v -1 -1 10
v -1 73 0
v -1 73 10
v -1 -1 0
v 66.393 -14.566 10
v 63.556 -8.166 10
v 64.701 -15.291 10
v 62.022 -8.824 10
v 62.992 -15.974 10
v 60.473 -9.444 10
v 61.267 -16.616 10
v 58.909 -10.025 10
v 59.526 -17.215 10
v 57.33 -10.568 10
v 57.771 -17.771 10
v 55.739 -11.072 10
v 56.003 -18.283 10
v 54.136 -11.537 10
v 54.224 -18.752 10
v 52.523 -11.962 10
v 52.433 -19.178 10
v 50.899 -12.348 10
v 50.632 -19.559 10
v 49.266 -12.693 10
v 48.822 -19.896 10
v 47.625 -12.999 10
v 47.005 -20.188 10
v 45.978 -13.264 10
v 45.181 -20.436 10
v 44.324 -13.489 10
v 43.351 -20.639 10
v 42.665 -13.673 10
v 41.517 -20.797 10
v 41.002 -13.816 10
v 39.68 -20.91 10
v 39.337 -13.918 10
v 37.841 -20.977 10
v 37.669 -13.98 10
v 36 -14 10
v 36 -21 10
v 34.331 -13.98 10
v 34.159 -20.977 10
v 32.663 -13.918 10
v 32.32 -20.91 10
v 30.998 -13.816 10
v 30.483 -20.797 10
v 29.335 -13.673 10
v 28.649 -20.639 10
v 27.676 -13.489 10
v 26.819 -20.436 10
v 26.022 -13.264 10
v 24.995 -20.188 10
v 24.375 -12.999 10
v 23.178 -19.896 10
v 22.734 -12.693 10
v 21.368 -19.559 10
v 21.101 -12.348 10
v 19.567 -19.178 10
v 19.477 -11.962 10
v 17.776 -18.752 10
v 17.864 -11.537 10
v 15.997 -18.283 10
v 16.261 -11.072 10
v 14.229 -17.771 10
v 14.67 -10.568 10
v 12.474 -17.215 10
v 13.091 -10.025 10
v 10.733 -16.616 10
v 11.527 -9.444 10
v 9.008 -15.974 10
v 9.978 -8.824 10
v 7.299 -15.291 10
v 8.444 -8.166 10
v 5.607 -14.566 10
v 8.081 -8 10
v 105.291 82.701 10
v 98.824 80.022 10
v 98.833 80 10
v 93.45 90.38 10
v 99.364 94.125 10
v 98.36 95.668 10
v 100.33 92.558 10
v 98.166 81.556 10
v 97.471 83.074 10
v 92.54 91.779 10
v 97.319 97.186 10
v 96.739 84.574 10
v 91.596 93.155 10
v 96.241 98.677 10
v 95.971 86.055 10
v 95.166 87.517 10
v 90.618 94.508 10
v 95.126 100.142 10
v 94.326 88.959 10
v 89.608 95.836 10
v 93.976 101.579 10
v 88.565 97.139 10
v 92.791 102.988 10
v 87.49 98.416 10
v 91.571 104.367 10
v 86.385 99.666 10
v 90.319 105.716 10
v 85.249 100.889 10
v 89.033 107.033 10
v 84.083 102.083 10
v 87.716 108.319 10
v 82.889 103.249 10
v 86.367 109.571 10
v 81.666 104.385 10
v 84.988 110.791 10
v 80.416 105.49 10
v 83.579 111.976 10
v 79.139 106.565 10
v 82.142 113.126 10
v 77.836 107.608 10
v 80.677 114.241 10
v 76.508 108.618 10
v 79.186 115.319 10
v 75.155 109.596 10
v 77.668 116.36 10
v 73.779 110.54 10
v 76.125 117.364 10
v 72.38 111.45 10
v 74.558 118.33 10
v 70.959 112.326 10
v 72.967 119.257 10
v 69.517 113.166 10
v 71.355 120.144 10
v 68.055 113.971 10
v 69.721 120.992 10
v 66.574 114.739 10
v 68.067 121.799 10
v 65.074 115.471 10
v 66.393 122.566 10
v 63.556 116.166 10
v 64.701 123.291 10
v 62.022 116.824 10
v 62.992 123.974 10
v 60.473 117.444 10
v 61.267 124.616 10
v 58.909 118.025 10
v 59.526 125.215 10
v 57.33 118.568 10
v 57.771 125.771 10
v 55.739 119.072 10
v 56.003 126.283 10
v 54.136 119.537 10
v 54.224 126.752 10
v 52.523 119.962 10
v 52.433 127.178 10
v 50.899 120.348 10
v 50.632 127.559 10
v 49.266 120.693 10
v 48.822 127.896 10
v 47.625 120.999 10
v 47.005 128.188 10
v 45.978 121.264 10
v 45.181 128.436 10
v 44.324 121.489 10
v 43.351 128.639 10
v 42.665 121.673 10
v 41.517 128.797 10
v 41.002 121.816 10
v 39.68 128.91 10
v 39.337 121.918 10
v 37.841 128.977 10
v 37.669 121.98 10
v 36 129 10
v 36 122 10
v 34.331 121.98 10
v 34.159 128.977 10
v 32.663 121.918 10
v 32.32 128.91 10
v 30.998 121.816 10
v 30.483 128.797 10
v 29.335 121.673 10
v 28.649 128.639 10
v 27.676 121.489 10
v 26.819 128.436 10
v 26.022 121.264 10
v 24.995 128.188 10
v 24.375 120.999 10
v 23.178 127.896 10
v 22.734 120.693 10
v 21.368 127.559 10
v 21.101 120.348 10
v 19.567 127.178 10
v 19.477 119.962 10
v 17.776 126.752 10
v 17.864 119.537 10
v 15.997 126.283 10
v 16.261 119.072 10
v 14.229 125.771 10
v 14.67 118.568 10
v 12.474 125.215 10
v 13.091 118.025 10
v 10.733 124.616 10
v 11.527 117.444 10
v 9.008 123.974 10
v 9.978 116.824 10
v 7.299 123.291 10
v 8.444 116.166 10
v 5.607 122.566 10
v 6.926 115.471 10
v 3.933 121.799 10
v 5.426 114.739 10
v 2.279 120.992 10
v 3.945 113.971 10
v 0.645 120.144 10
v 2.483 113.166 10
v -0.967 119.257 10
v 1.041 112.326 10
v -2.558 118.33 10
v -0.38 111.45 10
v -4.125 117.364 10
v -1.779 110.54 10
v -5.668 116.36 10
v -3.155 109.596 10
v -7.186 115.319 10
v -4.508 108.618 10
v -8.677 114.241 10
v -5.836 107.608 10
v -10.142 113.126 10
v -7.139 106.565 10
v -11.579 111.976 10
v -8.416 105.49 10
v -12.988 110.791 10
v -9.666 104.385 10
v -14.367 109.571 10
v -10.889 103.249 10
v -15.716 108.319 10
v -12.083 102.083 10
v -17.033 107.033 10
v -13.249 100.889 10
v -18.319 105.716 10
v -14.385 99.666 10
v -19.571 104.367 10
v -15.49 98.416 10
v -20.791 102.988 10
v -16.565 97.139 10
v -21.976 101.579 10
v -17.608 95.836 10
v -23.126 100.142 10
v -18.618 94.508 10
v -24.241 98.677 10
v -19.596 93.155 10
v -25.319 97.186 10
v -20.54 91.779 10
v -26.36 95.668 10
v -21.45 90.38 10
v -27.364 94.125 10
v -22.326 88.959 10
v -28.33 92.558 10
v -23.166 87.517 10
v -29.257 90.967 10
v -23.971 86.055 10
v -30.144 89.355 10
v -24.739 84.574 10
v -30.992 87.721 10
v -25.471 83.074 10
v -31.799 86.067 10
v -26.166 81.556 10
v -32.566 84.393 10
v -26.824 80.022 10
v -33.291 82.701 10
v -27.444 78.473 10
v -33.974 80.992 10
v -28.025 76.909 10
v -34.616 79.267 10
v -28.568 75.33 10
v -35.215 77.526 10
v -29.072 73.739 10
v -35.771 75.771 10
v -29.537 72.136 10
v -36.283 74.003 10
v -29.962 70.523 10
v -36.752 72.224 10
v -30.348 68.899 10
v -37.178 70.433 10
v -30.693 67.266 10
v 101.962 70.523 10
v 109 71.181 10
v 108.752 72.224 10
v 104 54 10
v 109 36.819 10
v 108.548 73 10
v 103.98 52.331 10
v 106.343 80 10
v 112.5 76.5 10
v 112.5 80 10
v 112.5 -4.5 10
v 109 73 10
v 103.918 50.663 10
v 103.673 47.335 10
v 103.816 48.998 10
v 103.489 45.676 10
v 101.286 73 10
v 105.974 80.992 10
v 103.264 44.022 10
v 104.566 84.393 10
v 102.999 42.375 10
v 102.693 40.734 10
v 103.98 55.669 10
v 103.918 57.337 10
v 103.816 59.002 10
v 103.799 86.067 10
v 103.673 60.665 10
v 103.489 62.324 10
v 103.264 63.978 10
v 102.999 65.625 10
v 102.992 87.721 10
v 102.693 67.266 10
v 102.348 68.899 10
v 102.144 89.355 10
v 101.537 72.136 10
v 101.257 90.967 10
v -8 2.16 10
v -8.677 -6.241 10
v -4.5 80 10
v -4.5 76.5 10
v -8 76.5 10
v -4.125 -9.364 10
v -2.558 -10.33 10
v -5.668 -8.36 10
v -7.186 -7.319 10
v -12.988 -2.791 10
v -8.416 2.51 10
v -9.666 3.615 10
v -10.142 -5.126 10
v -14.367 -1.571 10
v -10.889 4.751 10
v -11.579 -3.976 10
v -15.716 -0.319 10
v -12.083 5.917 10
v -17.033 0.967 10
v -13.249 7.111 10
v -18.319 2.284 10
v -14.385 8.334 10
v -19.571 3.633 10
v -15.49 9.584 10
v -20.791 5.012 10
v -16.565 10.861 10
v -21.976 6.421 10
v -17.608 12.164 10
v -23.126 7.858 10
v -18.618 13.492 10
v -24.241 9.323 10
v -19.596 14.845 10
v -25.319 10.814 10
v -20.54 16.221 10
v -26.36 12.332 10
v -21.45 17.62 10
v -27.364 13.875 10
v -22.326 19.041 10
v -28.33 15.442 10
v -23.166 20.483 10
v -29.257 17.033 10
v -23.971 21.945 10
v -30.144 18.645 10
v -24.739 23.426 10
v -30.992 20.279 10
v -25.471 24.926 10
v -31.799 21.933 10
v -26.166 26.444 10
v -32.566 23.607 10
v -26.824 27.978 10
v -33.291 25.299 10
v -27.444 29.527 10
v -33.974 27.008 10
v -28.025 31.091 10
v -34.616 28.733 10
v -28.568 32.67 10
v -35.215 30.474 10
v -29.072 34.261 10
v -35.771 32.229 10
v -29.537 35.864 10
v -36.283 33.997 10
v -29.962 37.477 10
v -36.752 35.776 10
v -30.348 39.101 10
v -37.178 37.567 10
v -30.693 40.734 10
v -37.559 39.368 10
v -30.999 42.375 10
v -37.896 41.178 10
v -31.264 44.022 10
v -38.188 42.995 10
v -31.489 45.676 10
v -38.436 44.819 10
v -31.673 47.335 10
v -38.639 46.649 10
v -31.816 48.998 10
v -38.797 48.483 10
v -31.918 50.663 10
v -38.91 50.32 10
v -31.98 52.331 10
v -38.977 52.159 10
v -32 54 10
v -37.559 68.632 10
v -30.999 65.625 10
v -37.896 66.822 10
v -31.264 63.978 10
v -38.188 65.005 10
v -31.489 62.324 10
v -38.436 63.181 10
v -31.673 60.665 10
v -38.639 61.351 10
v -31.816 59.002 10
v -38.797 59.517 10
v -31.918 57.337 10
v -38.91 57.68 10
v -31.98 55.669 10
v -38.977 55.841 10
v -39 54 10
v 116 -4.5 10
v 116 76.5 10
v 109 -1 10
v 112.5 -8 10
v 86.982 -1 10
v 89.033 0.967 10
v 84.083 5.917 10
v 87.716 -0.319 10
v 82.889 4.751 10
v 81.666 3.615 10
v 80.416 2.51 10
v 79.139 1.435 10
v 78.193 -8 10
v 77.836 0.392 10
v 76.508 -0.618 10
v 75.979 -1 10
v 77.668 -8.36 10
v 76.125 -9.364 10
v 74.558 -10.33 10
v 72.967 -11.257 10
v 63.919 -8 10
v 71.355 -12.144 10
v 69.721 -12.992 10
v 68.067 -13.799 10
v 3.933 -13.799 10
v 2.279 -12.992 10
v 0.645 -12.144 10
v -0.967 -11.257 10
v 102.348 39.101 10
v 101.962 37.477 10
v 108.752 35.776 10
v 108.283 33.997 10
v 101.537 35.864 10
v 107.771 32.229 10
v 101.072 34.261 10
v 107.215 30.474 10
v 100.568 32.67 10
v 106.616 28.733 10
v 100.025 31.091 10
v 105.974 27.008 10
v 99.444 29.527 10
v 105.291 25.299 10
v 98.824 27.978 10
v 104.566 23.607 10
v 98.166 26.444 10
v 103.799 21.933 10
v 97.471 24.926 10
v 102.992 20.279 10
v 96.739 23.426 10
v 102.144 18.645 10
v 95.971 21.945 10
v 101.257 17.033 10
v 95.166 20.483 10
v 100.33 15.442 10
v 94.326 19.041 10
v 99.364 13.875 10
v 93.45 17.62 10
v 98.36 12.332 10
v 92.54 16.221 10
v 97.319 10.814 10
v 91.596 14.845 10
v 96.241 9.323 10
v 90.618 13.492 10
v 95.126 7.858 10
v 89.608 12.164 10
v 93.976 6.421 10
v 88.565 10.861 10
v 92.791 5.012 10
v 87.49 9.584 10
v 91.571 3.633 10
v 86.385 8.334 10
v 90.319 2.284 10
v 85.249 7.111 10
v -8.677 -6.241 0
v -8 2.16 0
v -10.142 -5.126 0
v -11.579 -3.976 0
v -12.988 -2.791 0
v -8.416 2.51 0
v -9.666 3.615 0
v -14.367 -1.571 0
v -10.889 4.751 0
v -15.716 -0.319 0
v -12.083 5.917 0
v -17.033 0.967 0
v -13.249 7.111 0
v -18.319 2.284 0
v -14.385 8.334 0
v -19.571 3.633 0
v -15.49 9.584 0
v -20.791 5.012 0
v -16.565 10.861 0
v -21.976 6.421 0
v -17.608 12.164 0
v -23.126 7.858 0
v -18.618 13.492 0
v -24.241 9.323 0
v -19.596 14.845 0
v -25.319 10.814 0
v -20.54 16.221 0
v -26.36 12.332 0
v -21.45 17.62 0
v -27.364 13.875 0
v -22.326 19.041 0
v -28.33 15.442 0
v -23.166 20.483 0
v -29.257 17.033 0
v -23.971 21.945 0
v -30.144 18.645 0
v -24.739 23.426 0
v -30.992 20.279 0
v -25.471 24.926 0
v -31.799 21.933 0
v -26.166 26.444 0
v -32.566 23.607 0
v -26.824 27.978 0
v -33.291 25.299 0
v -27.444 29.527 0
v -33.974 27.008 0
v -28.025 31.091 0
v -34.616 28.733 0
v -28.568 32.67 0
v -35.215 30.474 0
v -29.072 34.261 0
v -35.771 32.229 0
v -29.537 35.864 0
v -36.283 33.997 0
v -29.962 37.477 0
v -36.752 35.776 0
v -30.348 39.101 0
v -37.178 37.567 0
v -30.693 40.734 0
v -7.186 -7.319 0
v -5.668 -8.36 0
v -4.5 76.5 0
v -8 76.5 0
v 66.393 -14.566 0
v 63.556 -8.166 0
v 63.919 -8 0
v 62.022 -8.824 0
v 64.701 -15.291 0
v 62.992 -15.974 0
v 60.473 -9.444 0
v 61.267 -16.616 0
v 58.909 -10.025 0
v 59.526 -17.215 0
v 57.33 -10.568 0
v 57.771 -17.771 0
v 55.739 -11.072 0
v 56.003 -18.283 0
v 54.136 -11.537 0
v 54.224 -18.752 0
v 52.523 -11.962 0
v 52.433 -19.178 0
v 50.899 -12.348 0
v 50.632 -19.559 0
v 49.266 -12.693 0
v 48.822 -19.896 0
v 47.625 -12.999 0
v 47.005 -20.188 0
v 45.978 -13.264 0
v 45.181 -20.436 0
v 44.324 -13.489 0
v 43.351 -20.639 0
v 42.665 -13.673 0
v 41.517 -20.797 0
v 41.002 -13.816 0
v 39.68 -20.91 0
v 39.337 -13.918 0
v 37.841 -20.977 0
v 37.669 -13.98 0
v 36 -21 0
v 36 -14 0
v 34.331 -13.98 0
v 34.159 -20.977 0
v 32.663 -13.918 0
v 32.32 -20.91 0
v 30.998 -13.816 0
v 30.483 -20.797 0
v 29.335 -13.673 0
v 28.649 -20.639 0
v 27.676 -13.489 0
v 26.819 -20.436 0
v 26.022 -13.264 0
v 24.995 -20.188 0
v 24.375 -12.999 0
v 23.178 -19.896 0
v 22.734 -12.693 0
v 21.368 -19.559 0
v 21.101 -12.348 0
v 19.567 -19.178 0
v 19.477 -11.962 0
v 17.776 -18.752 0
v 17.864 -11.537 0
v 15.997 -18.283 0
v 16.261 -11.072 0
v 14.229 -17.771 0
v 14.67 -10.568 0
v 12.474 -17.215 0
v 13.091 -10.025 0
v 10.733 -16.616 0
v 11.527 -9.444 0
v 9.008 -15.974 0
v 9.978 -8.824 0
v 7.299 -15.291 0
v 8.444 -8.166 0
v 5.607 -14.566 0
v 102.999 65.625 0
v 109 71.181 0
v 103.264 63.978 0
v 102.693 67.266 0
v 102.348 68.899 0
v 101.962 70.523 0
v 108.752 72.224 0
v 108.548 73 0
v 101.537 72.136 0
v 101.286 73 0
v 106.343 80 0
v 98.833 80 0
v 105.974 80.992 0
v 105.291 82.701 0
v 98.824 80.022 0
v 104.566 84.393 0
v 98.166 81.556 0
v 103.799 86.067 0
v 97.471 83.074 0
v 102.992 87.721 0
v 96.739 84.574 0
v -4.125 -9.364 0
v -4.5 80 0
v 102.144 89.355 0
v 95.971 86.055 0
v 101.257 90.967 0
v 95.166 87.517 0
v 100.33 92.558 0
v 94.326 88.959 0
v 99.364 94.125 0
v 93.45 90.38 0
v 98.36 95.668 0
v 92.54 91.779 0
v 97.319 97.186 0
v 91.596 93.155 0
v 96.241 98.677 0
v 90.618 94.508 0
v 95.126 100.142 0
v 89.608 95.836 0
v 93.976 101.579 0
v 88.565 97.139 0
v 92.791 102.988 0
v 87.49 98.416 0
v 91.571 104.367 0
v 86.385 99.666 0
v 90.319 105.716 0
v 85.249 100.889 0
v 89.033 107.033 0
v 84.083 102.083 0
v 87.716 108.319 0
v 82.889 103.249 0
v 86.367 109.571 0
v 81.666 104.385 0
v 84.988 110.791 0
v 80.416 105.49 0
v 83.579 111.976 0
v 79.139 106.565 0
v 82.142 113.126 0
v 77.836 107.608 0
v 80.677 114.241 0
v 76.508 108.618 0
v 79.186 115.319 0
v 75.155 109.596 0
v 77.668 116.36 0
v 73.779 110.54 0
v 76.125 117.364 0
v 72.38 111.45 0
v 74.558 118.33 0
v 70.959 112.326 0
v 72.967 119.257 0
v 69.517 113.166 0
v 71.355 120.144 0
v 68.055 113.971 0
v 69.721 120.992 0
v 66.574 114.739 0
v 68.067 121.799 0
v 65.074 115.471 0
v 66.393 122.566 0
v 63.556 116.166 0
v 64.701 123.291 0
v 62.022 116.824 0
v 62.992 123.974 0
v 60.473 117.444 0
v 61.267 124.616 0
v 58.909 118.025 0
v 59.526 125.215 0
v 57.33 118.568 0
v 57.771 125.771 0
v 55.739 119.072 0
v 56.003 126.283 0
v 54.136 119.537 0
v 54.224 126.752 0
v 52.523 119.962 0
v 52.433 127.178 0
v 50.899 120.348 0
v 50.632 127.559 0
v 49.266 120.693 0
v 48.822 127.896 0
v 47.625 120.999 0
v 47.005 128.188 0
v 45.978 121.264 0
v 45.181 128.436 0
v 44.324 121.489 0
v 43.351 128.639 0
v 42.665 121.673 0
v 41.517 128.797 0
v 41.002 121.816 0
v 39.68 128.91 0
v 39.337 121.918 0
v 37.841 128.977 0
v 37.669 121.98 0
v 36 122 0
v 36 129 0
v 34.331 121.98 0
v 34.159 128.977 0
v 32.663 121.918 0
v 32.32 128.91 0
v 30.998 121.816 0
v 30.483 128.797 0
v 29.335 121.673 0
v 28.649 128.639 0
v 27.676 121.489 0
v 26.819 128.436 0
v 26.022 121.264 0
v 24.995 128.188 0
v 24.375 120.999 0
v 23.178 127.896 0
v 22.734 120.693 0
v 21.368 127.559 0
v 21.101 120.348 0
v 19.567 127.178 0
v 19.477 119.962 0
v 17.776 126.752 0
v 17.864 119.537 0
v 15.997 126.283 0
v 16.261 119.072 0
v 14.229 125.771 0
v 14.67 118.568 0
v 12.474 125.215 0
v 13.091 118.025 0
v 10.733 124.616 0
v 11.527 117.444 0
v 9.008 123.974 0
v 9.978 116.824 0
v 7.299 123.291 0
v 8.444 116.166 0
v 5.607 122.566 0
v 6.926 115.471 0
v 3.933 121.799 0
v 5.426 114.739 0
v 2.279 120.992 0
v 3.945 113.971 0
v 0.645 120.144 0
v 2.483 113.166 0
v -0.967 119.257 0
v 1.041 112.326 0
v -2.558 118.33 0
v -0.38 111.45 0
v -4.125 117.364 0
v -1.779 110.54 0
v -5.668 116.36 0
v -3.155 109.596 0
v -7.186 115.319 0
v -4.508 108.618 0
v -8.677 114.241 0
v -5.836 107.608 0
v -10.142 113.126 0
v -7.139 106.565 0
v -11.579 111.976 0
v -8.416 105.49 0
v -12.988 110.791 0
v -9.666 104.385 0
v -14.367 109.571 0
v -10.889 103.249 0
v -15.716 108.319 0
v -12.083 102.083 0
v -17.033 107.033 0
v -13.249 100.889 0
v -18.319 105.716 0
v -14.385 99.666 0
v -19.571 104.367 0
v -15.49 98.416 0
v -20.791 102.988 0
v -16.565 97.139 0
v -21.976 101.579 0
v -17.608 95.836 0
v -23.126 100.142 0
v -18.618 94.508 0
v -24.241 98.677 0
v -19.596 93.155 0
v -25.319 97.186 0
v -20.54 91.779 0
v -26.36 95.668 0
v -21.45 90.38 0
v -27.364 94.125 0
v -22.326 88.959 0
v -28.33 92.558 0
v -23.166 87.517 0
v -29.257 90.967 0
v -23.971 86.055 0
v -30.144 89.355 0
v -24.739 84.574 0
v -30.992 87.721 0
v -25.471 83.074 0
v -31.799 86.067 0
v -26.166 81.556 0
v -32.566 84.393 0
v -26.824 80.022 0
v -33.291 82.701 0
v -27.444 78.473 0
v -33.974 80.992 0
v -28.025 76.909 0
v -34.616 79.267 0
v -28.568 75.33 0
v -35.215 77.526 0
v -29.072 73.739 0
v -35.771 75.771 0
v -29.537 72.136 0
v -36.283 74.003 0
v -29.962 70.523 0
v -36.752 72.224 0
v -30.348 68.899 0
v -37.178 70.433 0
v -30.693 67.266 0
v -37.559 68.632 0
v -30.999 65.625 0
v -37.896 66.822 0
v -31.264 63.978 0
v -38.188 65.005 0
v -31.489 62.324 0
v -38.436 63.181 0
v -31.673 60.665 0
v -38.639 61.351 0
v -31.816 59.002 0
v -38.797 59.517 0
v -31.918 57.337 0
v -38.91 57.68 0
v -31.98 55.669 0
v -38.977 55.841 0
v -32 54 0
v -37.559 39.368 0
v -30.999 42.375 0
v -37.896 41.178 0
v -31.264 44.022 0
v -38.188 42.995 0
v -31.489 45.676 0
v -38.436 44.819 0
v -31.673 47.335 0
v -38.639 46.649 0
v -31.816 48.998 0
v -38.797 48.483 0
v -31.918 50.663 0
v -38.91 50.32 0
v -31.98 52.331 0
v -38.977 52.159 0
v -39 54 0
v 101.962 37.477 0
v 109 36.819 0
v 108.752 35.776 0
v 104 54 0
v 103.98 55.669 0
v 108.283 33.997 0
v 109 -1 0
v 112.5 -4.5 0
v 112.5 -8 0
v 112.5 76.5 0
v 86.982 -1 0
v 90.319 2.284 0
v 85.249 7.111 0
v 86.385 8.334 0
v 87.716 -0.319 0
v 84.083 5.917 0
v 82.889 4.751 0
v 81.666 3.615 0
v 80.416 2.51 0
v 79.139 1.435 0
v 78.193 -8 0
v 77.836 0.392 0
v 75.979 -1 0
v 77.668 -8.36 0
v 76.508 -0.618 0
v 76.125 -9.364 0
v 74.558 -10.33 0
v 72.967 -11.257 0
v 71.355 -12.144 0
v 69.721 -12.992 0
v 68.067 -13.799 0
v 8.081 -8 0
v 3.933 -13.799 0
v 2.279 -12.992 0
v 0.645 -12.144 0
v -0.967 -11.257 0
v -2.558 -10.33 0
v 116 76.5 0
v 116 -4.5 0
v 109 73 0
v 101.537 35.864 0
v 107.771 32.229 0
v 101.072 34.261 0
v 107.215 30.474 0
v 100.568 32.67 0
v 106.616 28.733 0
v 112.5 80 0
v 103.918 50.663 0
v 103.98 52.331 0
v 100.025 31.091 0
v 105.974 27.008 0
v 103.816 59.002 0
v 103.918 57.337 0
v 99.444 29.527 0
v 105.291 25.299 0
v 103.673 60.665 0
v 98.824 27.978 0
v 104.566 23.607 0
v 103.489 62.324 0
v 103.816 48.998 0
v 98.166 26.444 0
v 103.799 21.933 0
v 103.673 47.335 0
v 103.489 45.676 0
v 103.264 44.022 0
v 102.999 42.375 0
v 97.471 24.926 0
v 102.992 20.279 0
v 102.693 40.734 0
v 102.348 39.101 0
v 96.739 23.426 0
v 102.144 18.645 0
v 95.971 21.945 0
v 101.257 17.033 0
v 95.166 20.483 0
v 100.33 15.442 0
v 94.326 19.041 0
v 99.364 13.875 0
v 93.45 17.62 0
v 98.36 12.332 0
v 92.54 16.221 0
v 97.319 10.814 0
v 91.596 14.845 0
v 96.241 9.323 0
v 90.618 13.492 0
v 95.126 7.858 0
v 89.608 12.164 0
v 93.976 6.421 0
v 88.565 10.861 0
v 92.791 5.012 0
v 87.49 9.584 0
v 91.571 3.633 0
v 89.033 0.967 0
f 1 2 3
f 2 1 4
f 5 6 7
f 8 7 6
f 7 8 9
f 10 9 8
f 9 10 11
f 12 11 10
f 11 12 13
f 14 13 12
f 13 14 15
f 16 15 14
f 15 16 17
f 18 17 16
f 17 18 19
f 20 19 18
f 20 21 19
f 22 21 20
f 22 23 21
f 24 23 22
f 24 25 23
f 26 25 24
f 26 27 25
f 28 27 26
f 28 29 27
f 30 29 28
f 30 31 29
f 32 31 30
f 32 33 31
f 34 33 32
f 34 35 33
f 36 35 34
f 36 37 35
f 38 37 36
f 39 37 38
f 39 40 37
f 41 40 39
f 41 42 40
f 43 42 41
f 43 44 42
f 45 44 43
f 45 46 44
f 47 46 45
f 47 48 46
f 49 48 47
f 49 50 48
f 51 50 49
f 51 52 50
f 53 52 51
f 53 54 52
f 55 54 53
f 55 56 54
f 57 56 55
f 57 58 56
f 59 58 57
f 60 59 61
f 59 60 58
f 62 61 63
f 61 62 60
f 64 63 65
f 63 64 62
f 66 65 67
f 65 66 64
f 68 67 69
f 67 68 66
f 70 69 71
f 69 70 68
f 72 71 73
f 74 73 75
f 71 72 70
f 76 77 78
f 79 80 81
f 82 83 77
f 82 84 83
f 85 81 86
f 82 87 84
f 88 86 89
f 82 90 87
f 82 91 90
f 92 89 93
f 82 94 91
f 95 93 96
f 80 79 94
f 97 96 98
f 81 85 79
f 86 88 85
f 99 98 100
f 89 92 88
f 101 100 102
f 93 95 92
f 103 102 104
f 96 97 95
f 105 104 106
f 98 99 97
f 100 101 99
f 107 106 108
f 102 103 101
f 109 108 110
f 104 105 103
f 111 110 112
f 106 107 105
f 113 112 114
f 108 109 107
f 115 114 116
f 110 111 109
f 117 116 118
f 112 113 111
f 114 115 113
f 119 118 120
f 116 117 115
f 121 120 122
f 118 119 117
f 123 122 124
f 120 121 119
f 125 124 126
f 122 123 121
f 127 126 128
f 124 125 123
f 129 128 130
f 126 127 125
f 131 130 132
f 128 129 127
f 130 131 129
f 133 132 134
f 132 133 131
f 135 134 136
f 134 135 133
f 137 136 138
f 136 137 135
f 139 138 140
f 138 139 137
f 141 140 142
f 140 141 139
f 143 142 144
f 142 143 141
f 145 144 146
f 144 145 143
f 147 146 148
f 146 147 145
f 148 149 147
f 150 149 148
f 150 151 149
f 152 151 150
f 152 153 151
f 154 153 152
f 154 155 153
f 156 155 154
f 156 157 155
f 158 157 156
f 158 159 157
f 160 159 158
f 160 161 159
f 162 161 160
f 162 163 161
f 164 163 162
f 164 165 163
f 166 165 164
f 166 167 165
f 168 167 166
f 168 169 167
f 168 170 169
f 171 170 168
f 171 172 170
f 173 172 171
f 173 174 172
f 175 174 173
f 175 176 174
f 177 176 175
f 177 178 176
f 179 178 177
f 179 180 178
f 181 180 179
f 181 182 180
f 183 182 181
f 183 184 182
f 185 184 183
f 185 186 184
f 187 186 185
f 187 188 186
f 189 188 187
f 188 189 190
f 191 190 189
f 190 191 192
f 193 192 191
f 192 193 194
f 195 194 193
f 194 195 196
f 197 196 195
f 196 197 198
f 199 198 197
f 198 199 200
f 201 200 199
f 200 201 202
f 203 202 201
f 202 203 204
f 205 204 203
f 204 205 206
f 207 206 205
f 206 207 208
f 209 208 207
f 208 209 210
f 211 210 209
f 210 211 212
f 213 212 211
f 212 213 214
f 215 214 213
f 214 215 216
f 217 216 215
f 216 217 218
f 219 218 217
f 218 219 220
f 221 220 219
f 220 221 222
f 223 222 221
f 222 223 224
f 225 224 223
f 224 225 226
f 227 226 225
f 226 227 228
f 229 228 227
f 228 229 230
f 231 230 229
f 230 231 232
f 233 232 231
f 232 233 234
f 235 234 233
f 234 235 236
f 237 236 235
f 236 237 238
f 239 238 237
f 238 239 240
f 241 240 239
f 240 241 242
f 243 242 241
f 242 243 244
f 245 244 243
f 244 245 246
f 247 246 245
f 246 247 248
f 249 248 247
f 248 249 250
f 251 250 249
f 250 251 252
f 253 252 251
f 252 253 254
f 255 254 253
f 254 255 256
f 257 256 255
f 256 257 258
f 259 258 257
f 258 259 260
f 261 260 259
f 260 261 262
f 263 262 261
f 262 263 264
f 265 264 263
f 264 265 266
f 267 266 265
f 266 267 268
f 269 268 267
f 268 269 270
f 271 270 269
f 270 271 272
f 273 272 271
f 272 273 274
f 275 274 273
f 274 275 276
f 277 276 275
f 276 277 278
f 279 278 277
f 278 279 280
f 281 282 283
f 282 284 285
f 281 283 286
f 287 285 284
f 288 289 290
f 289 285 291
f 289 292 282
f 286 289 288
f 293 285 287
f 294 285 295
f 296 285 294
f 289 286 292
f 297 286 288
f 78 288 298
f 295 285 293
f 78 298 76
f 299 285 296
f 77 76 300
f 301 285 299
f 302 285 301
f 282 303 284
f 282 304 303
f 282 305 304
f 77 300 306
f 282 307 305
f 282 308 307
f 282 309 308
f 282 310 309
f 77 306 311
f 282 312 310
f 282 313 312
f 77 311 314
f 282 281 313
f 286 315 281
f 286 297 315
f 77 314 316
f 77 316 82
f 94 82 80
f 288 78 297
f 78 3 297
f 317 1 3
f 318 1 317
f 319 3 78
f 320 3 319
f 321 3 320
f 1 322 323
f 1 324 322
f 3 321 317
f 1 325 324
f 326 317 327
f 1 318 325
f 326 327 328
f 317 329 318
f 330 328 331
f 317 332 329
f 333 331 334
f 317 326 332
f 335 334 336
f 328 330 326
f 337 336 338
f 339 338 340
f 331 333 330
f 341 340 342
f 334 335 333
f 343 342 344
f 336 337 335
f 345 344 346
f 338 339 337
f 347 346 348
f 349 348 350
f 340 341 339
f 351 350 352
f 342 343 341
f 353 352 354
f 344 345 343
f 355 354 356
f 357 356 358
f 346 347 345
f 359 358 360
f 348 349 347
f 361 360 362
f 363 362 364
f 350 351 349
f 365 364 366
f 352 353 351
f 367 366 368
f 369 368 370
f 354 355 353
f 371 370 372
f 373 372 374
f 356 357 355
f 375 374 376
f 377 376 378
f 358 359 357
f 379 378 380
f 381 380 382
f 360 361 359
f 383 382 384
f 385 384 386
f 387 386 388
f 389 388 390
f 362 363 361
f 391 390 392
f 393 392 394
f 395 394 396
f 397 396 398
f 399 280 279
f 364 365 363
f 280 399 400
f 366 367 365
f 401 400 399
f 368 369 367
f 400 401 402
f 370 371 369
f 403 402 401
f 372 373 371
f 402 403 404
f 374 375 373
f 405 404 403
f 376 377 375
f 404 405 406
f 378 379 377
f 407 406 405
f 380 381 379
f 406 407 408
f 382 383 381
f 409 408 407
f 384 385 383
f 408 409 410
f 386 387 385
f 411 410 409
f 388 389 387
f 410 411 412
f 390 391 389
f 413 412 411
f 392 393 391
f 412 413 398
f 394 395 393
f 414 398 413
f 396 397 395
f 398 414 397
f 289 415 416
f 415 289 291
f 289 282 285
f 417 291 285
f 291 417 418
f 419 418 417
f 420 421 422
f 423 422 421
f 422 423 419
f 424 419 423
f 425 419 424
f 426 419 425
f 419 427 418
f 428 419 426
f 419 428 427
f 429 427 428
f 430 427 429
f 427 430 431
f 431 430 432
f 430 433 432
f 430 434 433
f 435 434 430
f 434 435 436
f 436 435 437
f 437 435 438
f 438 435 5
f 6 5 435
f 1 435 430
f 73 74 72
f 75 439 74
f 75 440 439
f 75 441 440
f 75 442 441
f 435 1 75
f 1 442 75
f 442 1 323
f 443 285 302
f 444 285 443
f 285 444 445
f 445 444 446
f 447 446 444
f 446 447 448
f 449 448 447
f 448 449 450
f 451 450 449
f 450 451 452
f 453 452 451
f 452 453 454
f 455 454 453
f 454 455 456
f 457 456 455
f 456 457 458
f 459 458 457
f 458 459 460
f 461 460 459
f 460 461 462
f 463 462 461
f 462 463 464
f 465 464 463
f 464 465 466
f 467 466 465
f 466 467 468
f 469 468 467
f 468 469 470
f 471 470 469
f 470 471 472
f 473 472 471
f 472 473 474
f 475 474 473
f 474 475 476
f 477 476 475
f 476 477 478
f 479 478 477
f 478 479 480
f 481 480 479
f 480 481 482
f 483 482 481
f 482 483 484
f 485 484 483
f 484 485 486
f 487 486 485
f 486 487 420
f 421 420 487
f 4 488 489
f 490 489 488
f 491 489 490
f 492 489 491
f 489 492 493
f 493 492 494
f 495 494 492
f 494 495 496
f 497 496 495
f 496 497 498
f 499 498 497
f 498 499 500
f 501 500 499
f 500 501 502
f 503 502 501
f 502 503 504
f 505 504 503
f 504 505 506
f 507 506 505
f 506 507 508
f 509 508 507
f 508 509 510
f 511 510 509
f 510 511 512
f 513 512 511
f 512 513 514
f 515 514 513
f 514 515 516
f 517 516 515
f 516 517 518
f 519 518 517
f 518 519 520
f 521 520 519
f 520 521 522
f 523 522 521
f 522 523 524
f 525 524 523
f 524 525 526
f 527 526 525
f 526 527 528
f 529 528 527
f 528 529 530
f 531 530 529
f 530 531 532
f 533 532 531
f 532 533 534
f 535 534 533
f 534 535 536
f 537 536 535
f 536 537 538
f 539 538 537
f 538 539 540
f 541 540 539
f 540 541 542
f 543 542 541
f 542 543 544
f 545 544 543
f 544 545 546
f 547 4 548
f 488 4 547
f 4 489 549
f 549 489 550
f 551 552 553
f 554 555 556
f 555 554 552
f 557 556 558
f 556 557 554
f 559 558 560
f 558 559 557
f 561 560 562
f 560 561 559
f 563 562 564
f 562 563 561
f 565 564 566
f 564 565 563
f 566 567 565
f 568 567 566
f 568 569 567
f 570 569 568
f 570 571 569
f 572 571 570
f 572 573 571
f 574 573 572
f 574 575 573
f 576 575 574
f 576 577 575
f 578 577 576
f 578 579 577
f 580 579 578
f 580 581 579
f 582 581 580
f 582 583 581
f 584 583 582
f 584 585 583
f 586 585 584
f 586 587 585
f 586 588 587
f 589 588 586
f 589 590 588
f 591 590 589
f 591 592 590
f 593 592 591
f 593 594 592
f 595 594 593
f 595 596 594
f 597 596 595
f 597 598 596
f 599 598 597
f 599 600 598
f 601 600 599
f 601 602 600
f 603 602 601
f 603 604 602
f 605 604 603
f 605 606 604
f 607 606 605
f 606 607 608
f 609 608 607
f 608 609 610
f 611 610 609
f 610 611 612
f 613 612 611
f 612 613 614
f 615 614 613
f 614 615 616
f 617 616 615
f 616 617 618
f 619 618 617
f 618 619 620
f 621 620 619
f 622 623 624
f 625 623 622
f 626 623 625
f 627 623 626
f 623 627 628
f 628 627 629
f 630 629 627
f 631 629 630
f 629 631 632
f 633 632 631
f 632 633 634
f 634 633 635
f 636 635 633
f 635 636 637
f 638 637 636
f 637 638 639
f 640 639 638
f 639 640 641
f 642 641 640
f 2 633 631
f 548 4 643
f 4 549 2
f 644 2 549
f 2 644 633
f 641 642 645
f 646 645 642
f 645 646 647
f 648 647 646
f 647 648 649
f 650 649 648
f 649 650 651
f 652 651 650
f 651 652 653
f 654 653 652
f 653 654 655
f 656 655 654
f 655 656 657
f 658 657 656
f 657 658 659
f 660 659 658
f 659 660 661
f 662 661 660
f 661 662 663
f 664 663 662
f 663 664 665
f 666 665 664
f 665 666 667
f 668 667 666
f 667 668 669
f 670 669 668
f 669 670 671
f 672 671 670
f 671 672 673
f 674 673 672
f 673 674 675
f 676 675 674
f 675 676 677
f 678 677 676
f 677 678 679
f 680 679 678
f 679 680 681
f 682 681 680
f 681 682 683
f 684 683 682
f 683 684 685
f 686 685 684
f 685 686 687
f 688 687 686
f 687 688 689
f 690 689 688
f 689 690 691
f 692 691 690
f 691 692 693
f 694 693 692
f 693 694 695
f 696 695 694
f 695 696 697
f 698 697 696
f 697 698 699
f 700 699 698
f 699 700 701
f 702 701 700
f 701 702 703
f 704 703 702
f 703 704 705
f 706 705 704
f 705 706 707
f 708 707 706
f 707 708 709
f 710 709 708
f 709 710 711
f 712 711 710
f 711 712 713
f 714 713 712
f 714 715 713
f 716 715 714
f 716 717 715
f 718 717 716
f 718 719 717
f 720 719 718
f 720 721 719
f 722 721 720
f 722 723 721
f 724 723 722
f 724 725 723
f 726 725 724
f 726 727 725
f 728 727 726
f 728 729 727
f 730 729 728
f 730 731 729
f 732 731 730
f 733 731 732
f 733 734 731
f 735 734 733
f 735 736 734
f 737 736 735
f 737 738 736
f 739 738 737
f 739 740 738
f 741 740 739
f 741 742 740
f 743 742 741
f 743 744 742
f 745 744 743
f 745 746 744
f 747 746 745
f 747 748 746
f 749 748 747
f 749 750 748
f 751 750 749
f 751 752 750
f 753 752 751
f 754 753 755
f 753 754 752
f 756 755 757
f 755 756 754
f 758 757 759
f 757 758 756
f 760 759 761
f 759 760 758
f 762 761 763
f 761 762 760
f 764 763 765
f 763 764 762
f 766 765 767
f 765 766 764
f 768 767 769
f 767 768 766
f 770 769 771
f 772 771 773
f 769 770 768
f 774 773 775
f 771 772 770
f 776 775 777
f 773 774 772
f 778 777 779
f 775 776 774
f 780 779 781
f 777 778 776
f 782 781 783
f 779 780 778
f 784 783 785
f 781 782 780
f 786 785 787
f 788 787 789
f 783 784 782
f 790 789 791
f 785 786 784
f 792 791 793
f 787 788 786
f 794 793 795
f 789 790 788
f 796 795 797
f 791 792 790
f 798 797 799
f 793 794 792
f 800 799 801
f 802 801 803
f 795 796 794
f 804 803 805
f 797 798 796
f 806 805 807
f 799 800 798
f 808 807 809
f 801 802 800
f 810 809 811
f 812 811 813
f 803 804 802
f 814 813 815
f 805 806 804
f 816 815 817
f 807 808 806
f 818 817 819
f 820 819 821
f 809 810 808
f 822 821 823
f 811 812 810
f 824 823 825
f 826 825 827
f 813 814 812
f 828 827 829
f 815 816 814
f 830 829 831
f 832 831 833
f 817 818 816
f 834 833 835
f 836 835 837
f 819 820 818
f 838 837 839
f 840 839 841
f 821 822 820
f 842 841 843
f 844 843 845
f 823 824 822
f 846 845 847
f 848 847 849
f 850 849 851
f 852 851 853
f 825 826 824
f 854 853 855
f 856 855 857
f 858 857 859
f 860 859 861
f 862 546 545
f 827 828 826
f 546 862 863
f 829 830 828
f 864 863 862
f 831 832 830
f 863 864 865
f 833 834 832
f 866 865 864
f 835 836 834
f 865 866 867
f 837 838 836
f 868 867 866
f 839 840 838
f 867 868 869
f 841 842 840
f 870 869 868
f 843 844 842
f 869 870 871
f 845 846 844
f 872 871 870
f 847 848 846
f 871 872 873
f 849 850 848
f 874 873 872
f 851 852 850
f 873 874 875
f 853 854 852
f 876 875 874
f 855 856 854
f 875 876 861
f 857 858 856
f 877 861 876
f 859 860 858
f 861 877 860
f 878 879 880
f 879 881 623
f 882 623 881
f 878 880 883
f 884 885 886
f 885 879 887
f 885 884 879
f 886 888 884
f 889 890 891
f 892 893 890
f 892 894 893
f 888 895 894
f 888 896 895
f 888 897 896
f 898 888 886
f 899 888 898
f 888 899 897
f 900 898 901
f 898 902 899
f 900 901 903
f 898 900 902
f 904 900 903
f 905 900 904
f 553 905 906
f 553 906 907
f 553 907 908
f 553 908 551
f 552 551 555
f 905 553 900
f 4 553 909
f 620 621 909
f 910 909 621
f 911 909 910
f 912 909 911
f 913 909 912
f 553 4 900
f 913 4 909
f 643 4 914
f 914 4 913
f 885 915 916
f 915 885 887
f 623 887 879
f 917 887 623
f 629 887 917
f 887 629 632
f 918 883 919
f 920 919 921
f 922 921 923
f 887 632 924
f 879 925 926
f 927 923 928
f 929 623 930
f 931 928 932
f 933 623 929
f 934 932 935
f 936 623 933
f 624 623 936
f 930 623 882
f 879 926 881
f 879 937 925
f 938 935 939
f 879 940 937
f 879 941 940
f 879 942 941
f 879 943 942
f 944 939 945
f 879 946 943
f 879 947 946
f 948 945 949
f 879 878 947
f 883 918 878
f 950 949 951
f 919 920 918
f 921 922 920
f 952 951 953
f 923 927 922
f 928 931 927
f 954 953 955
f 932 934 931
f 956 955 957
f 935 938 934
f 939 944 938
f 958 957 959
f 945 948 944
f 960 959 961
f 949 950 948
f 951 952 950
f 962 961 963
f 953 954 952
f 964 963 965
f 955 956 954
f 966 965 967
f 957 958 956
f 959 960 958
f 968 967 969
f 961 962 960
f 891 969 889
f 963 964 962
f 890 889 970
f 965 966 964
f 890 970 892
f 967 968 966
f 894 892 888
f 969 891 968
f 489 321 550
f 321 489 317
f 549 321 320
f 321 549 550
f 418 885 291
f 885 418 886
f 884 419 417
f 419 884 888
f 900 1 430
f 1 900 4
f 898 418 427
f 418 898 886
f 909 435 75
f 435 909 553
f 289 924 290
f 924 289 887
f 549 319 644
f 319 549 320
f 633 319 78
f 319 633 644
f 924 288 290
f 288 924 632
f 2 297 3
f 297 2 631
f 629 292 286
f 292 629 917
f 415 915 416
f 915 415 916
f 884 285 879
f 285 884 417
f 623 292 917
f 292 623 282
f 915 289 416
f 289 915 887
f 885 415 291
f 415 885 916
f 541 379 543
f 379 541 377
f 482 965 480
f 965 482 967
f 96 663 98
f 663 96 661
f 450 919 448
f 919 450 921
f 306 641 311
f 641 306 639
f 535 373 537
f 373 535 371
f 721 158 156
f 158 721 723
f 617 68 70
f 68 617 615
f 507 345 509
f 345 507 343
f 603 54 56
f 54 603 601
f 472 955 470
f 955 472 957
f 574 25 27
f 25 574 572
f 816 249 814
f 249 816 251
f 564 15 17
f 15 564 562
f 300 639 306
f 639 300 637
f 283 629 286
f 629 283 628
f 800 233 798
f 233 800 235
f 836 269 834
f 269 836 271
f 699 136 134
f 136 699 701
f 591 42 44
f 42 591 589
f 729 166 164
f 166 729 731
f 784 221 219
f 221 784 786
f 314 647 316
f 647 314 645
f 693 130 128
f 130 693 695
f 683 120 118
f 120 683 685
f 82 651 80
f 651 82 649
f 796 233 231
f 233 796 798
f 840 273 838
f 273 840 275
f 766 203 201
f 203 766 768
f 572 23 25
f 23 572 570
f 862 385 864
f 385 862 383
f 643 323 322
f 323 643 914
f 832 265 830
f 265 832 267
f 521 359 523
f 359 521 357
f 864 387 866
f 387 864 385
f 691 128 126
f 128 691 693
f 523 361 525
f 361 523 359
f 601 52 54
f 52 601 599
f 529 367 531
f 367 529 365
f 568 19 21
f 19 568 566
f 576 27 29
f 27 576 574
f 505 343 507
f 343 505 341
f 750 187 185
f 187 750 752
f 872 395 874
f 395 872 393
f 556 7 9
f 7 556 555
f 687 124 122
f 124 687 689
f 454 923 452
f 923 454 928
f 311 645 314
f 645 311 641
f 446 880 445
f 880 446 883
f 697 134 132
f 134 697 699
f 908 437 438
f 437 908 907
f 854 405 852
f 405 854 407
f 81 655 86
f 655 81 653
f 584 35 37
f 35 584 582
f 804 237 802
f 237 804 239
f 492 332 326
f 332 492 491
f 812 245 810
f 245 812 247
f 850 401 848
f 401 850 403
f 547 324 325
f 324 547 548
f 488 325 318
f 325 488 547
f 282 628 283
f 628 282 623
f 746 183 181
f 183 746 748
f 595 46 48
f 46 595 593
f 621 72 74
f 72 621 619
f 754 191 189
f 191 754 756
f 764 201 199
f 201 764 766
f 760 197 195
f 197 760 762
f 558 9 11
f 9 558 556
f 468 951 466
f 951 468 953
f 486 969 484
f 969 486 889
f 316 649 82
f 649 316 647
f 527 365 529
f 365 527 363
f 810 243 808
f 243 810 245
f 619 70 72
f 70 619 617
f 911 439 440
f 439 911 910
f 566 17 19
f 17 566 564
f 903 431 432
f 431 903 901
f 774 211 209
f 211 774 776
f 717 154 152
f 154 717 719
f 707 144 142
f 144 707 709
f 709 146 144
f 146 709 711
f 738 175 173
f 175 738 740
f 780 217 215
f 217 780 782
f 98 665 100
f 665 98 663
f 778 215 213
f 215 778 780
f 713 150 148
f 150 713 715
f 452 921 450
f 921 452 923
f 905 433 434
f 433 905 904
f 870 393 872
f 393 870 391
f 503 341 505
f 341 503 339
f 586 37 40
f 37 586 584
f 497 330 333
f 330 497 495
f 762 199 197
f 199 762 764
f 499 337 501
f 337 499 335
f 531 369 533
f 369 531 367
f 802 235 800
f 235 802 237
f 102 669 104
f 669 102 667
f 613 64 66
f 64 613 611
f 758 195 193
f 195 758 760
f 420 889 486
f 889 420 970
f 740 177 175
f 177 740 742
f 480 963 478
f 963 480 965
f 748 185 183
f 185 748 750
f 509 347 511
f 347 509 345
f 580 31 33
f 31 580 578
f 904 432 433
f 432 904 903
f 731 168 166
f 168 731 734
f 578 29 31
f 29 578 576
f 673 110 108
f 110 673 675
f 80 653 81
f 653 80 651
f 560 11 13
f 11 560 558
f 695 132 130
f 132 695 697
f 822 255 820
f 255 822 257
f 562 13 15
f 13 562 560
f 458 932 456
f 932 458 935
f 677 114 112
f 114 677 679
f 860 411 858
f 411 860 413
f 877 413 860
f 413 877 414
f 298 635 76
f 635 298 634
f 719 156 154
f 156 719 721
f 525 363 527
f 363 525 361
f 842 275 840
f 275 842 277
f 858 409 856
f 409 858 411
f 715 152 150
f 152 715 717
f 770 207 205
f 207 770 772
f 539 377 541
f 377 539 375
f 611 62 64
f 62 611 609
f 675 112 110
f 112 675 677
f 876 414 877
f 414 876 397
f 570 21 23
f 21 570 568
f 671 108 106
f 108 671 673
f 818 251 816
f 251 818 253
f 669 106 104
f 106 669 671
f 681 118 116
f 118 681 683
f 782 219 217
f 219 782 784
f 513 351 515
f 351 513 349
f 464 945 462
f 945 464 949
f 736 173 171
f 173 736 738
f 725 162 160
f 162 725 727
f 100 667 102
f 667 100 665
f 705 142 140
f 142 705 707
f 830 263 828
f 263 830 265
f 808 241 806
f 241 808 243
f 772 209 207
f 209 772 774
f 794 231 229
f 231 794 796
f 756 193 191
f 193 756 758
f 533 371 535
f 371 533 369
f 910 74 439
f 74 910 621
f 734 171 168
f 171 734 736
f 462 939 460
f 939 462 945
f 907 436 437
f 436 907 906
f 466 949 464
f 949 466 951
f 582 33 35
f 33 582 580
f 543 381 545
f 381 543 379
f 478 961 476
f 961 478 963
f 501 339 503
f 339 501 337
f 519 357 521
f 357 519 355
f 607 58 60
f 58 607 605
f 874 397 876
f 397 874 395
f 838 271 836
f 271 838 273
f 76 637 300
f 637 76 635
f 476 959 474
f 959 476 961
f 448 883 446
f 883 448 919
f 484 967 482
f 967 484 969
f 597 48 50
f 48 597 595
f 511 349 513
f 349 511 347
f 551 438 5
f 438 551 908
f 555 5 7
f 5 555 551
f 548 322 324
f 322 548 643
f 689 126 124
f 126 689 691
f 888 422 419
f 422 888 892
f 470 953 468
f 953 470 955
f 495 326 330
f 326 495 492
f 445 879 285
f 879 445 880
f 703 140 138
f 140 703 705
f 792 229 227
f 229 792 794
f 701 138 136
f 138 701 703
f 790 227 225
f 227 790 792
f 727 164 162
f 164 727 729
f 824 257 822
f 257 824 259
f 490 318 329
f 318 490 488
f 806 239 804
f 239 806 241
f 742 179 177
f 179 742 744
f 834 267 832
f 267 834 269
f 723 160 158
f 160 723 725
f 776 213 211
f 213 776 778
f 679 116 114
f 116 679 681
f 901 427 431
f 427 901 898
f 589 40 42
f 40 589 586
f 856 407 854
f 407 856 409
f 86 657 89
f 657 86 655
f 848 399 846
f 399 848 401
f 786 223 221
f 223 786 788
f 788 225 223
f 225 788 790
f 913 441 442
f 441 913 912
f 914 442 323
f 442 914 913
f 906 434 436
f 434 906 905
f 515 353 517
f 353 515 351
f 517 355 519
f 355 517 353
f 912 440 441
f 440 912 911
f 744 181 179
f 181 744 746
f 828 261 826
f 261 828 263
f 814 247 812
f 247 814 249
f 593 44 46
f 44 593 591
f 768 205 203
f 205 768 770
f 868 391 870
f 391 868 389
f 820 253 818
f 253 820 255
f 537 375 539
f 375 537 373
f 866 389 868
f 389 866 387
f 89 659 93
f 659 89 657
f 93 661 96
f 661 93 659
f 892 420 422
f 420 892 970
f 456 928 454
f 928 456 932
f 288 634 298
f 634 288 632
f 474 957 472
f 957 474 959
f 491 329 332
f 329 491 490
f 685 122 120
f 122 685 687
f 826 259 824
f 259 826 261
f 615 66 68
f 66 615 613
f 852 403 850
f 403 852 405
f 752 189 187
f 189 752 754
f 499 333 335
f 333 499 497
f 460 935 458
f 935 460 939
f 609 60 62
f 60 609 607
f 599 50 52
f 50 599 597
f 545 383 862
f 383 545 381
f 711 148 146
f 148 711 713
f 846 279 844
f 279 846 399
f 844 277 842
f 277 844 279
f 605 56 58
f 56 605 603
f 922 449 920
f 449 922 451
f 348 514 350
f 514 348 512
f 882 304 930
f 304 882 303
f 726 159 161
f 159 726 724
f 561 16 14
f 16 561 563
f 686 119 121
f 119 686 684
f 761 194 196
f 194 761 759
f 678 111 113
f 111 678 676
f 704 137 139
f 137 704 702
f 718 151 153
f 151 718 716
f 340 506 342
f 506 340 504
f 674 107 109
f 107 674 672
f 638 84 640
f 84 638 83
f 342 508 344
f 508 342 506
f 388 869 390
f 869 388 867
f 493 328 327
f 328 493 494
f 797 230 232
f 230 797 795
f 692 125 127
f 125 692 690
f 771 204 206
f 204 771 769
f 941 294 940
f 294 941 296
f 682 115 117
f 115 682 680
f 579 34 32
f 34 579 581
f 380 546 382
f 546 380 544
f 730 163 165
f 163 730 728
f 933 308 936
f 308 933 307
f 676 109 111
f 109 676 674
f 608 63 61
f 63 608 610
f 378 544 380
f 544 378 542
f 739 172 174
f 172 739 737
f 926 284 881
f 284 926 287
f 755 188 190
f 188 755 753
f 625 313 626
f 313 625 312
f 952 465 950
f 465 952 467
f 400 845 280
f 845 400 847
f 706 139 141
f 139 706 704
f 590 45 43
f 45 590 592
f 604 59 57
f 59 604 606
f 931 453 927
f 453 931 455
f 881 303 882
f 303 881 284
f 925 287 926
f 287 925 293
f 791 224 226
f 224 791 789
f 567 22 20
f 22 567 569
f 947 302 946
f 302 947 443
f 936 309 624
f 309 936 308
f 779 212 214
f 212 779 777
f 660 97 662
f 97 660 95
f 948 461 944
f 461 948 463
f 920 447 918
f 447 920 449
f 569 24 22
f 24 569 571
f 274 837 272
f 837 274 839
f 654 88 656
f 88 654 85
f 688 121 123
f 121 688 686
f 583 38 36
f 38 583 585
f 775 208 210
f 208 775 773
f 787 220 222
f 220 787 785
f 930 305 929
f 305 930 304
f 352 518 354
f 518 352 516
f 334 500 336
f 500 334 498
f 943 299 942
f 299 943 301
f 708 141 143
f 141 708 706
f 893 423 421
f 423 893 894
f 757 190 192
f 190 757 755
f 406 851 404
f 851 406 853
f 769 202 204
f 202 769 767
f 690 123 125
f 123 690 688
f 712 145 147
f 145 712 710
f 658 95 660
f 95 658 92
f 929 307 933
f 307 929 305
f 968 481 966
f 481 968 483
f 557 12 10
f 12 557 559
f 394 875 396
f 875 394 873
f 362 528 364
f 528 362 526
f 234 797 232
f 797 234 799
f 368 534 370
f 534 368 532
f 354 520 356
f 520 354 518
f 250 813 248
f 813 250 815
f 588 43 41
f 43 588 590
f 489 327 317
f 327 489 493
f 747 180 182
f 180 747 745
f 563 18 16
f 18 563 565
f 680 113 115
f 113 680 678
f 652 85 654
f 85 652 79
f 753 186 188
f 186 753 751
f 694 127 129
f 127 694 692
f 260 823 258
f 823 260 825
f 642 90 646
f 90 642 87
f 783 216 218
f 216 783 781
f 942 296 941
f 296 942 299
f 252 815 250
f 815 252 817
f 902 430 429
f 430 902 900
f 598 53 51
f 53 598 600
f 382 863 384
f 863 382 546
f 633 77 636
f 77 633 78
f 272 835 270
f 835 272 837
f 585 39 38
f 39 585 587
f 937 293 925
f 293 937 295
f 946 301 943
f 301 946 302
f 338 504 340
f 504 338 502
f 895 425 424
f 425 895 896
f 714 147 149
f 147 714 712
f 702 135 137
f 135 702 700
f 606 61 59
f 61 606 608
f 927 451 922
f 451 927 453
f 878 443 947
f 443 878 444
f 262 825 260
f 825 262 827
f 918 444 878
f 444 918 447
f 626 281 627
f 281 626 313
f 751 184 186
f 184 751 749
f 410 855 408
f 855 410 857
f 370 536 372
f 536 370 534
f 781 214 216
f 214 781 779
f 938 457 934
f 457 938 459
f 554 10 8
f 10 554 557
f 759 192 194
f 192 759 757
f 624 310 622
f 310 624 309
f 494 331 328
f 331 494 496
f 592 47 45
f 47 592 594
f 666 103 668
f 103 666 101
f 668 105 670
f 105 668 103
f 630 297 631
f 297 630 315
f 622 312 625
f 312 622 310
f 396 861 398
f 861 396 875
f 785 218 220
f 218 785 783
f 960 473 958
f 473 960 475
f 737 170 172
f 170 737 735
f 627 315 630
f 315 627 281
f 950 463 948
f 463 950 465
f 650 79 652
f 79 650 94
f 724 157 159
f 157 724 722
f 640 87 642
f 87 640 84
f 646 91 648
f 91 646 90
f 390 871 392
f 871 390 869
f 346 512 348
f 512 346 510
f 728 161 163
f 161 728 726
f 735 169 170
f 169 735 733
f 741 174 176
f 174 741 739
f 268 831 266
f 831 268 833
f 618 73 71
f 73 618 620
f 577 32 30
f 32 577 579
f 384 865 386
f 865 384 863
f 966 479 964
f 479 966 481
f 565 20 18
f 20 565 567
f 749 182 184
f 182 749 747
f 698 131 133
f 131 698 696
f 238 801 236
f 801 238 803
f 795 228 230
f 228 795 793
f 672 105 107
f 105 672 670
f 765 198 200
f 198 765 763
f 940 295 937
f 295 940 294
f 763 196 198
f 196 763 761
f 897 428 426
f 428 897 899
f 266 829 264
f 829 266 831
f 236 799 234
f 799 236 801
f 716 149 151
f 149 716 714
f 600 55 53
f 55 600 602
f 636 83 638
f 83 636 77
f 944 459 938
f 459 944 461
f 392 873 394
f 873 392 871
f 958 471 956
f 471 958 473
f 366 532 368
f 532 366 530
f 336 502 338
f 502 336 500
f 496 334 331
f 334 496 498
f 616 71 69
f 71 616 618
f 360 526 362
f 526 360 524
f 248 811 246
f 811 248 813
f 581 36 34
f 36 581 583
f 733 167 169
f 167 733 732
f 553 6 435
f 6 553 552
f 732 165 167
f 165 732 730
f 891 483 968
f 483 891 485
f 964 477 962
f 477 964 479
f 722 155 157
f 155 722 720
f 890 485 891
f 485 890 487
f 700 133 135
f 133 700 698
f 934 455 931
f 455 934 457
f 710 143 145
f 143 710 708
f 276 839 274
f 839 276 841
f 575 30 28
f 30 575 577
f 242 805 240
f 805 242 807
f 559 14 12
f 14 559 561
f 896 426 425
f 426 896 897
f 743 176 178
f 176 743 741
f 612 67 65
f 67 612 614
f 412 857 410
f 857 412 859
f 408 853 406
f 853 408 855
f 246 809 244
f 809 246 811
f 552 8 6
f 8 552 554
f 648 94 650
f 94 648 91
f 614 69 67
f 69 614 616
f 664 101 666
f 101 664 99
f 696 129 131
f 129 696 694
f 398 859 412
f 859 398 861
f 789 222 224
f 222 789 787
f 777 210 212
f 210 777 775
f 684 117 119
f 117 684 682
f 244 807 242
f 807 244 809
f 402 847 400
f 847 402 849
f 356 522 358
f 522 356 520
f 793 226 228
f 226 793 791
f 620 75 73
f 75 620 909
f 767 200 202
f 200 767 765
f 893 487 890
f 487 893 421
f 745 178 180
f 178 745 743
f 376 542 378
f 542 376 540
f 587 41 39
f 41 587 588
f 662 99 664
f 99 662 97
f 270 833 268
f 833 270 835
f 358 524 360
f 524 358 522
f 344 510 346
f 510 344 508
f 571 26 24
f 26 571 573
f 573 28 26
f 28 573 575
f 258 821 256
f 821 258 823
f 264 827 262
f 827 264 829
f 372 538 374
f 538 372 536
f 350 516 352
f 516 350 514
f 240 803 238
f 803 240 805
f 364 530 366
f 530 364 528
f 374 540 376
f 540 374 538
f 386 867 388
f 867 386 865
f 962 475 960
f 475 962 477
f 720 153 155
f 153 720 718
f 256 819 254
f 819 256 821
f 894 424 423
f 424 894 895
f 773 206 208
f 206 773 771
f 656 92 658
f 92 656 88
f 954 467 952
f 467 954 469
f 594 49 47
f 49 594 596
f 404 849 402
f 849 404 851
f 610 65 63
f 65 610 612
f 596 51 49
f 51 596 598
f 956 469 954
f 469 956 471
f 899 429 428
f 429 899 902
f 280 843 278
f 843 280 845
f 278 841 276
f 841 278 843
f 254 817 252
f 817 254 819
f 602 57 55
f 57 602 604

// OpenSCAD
// Generated by SolidPython 1.1.3 on 2026-07-06 20:40:14


union() {
	union() {
		translate(v = [-4.5000000000, 36.0000000000, 5.0000000000]) {
			cube(center = true, size = [7, 81, 10]);
		}
		translate(v = [54.0000000000, -4.5000000000, 5.0000000000]) {
			cube(center = true, size = [117, 7, 10]);
		}
		translate(v = [0, 81]) {
			translate(v = [54.0000000000, -4.5000000000, 5.0000000000]) {
				cube(center = true, size = [117, 7, 10]);
			}
		}
		translate(v = [117, 0]) {
			translate(v = [-4.5000000000, 36.0000000000, 5.0000000000]) {
				cube(center = true, size = [7, 81, 10]);
			}
		}
	}
	translate(v = [36.0000000000, 54.0000000000]) {
		difference() {
			cylinder($fn = 256, h = 10, r = 75.0000000000);
			cylinder($fn = 256, h = 10, r = 68.0000000000);
		}
	}
}
/***********************************************
*********      SolidPython code:      **********
************************************************

"""SCAD file export functions.

This module provides functions for exporting OpenSCAD geometries to .scad files.
"""

from typing import Dict, Optional
from pathlib import Path
import solid

from .config import ExportConfiguration, FileNamingConfig


def export_scad(
    geometry: solid.OpenSCADObject, output_path: Path, header: Optional[str] = None
) -> Path:
    """Export geometry to SCAD file.

    Parameters
    ----------
    geometry : solid.OpenSCADObject
        Geometry to export.
    output_path : Path
        Output file path.
    header : str, optional
        Header comment to add to SCAD file.

    Returns
    -------
    Path
        Path to created SCAD file.

    Raises
    ------
    IOError
        If file cannot be written.

    Examples
    --------
    >>> from pathlib import Path
    >>> import solid
    >>>
    >>> geometry = solid.cube([10, 10, 10])
    >>> output_path = Path('output/device.scad')
    >>> export_scad(geometry, output_path)
    """
    # Ensure parent directory exists
    output_path.parent.mkdir(parents=True, exist_ok=True)

    # Render to file
    try:
        solid.scad_render_to_file(geometry, str(output_path))
    except Exception as e:
        raise IOError(f"Failed to write SCAD file to {output_path}: {e}")

    _normalize_scad_file(output_path)

    # Add header if provided
    if header:
        _add_header_to_scad(output_path, header)
        _normalize_scad_file(output_path)

    return output_path


def _normalize_scad_file(scad_path: Path) -> None:
    """Strip trailing whitespace from generated SCAD text."""
    content = scad_path.read_text()
    normalized = "\n".join(line.rstrip() for line in content.splitlines()) + "\n"
    if normalized != content:
        scad_path.write_text(normalized)


def export_multiple_scad(
    geometries: Dict[str, solid.OpenSCADObject],
    config: ExportConfiguration,
    naming_config: Optional[FileNamingConfig] = None,
) -> Dict[str, Path]:
    """Export multiple geometries to SCAD files.

    Parameters
    ----------
    geometries : dict
        Dictionary mapping prefixes to geometries.
        Keys are used as filename prefixes.
    config : ExportConfiguration
        Export configuration.
    naming_config : FileNamingConfig, optional
        File naming configuration.

    Returns
    -------
    dict
        Dictionary mapping prefixes to output paths.

    Examples
    --------
    >>> geometries = {
    ...     'wells': wells_geometry,
    ...     'channels': channels_geometry,
    ...     'device': device_geometry
    ... }
    >>> config = ExportConfiguration(output_directory=Path('output'))
    >>> paths = export_multiple_scad(geometries, config)
    """
    output_paths = {}

    for prefix, geometry in geometries.items():
        # Create naming config for this geometry
        if naming_config:
            file_config = FileNamingConfig(
                prefix=prefix,
                version=naming_config.version,
                grid_size=naming_config.grid_size,
                suffix=naming_config.suffix,
            )
        else:
            file_config = FileNamingConfig(prefix=prefix)

        # Generate filename
        filename = file_config.generate_filename("scad")
        output_path = config.get_output_path(filename)

        # Export
        export_scad(geometry, output_path)
        output_paths[prefix] = output_path

    return output_paths


def _add_header_to_scad(scad_path: Path, header: str):
    """Add header comment to existing SCAD file.

    Parameters
    ----------
    scad_path : Path
        Path to SCAD file.
    header : str
        Header text to add.
    """
    # Read existing content
    with open(scad_path, "r") as f:
        content = f.read()

    # Prepend header
    header_comment = f"// {header}\n\n"
    with open(scad_path, "w") as f:
        f.write(header_comment + content)


def generate_scad_header(
    device_name: str, version: Optional[str] = None, description: Optional[str] = None
) -> str:
    """Generate SCAD file header comment.

    Parameters
    ----------
    device_name : str
        Device name.
    version : str, optional
        Version string.
    description : str, optional
        Device description.

    Returns
    -------
    str
        Header comment text.

    Examples
    --------
    >>> header = generate_scad_header(
    ...     'Two Compartment Device',
    ...     version='v1',
    ...     description='96-well format with microchannels'
    ... )
    """
    lines = []
    lines.append("=" * 60)
    lines.append(f"Device: {device_name}")

    if version:
        lines.append(f"Version: {version}")

    if description:
        lines.append(f"Description: {description}")

    lines.append("Generated by OpenMFD")
    lines.append("=" * 60)

    return "\n".join(lines)


def validate_scad_file(scad_path: Path) -> bool:
    """Validate that SCAD file exists and is readable.

    Parameters
    ----------
    scad_path : Path
        Path to SCAD file.

    Returns
    -------
    bool
        True if file is valid, False otherwise.
    """
    if not scad_path.exists():
        return False

    if not scad_path.is_file():
        return False

    # Try to read file
    try:
        with open(scad_path, "r") as f:
            content = f.read()
        return len(content) > 0
    except Exception:
        return False


************************************************/
